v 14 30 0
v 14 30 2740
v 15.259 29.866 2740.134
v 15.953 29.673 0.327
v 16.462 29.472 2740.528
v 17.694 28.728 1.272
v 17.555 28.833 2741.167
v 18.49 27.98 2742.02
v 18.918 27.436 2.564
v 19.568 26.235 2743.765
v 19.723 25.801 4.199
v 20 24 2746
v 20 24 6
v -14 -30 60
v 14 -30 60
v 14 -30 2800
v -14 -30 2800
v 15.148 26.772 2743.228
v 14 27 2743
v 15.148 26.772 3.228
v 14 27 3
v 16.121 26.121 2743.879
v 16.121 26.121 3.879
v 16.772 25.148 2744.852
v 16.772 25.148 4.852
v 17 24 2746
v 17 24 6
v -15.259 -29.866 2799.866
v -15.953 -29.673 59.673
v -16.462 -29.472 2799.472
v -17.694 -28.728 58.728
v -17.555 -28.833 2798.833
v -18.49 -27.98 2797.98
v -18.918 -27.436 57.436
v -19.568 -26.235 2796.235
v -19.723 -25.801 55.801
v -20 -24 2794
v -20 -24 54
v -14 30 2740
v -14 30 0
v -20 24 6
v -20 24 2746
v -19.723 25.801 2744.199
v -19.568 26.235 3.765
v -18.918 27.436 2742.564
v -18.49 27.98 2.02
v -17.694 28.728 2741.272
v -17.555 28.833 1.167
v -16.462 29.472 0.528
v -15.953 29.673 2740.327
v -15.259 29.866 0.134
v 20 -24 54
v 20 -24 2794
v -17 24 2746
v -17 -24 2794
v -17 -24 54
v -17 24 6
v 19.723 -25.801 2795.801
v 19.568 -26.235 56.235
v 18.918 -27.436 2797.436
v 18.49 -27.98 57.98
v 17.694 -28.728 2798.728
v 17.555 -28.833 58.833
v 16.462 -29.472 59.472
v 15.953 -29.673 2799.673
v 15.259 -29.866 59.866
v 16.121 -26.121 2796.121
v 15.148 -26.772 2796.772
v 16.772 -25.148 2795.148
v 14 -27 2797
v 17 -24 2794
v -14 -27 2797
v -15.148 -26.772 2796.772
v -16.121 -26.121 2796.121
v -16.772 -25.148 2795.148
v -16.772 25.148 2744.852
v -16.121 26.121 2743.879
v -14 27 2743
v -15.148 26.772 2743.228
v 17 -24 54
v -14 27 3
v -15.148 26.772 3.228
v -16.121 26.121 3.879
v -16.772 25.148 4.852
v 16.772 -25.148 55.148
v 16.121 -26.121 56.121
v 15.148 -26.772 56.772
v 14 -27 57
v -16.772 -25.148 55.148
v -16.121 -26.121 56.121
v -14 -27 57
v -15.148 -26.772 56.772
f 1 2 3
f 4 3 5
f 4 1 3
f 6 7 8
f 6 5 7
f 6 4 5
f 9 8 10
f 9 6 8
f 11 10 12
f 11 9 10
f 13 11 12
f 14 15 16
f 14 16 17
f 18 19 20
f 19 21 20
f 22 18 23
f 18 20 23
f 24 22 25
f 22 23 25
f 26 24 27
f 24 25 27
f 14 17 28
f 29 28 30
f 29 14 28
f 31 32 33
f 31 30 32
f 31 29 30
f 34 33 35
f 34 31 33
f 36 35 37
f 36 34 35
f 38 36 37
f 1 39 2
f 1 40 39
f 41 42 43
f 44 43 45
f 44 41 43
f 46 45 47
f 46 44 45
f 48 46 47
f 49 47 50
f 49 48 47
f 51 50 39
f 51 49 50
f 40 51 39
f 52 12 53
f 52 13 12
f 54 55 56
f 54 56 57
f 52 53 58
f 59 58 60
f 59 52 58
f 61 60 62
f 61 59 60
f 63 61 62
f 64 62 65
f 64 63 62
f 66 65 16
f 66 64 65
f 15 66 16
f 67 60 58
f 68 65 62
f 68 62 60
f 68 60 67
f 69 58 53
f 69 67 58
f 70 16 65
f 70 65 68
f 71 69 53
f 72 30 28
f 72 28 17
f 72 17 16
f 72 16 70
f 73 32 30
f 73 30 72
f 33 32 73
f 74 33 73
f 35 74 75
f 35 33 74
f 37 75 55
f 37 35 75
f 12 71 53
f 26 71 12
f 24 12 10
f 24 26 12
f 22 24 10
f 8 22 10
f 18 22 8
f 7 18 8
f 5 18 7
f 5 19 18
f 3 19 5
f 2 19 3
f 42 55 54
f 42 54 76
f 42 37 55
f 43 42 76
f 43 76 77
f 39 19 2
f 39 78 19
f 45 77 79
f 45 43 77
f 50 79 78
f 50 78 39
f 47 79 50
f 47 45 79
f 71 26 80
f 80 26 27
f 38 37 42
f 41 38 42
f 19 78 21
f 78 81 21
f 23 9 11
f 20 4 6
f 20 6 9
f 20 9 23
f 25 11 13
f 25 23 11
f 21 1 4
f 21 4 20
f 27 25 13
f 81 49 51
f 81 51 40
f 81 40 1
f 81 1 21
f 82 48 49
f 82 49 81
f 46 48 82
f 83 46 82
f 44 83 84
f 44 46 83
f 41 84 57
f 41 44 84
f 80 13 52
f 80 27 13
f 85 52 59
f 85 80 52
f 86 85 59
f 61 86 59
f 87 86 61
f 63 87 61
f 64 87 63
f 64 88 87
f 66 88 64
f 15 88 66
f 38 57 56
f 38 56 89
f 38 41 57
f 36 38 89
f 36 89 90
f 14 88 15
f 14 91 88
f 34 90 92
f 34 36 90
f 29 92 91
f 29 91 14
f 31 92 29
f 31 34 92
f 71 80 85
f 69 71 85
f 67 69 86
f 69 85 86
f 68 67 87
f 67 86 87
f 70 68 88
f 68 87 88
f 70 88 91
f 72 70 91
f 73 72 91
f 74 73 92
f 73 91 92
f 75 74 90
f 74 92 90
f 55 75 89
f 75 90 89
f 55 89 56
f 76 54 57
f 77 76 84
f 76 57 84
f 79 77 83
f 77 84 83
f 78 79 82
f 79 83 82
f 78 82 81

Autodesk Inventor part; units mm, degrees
ref_plane "YZ Plane" through (0, 0, 0) normal (1, 0, 0) x (0, 1, 0)
ref_plane "Start plane" through (0, 0, 0) normal (0, 0, 1) x (1, 0, 0)
ref_plane "End plane" through (0, 0, 2800) normal (0, 0, 1) x (1, 0, 0)
sketch "Sketch" plane through (0, 0, 0) normal (0, 0, 1) x (1, 0, 0)
  line L0 (-20, -24) -> (-20, 24)
  line L1 (-14, 30) -> (14, 30)
  line L2 (20, 24) -> (20, -24)
  line L3 (14, -30) -> (-14, -30)
  arc A0 (-20, -24) -> (-14, -30) centre (-14, -24) ccw
  arc A1 (20, 24) -> (14, 30) centre (14, 24) ccw
  arc A2 (-14, 30) -> (-20, 24) centre (-14, 24) ccw
  arc A3 (14, -30) -> (20, -24) centre (14, -24) ccw
  arc A4 (-14, 27) -> (-17, 24) centre (-14, 24) ccw
  line L4 (-14, 27) -> (14, 27)
  arc A5 (17, 24) -> (14, 27) centre (14, 24) ccw
  line L5 (17, 24) -> (17, -24)
  arc A6 (14, -27) -> (17, -24) centre (14, -24) ccw
  line L6 (14, -27) -> (-14, -27)
  arc A7 (-17, -24) -> (-14, -27) centre (-14, -24) ccw
  line L7 (-17, -24) -> (-17, 24)
  line L8 (0, 43.7397) -> (0, -43.7397) construction
  line L9 (-29.7397, 0) -> (29.7397, 0) construction
  dimension "d7" = 6
  dimension "d9" = 40
  dimension "d11" = 60
  dimension "d12" = 3
  dimension "d15" = 20
  dimension "d16" = 30
extrude "Body" add sketch "Sketch" along normal up to surface (2800 mm away) from surface at 0
sketch "Sketch3" plane through (0, 0, 0) normal (0, 0, 1) x (1, 0, 0)
  line L0 (0, 0) -> (10, 0)
ref_plane "Work Plane3" through (0, 0, 0) normal (0, -1, 0) x (1, 0, 0)
sketch "Sketch7" plane through (0, 0, 0) normal (1, 0, 0) x (0, 1, 0)
  line L0 (-30, 0) -> (-30, 2800) projected
  line L1 (-30, 0) -> (-30, 2800) projected
  line L2 (30, 0) -> (30, 2800) projected
  line L3 (30, 0) -> (30, 2800) projected
  line L4 (-30, 0) -> (-24, 0) projected
  line L5 (30, 0) -> (-30, 0)
  line L6 (30, 0) -> (-30, 60)
  line L7 (-30, 0) -> (-30, 2800) projected
  line L8 (30, 2800) -> (-30, 2800)
  line L9 (-30, 2800) -> (30, 2740)
  point P0 (0, 0)
  dimension "d26" = 45
  dimension "d27" = 45
extrude "Extrusion4" cut sketch "Sketch7" along normal through all both and the other way through all contours L0 L6 L5 L4 | L8 L2 L9
sketch "Sketch4" plane through (0, 0, 0) normal (0, -1, 0) x (1, 0, 0)
  line L0 (-2, 0) -> (12, 0) projected
  line L1 (-2, 2800) -> (12, 2800) projected
  dimension "d18" = 2800
equation "\"d7\" = G_IR"
equation "\"d9\" = G_W"
equation "\"d11\" = G_H"
equation "\"d12\" = G_T"
equation "\"d15\" = 0.5 * d9"
equation "\"d16\" = 0.5 * d11"
equation "\"d3\" = G_L"
equation "\"G_W\" = 40"
equation "\"G_H\" = 60"
equation "\"G_T\" = 3"
equation "\"G_IR\" = 6"
equation "\"G_L\" = d18"
equation "\"G_OFFSET_START\" = 0"
equation "\"G_OFFSET_END\" = 0"
properties part number "ISO 4019 - 60x40x3 - 2800" material "Steel, Mild"
